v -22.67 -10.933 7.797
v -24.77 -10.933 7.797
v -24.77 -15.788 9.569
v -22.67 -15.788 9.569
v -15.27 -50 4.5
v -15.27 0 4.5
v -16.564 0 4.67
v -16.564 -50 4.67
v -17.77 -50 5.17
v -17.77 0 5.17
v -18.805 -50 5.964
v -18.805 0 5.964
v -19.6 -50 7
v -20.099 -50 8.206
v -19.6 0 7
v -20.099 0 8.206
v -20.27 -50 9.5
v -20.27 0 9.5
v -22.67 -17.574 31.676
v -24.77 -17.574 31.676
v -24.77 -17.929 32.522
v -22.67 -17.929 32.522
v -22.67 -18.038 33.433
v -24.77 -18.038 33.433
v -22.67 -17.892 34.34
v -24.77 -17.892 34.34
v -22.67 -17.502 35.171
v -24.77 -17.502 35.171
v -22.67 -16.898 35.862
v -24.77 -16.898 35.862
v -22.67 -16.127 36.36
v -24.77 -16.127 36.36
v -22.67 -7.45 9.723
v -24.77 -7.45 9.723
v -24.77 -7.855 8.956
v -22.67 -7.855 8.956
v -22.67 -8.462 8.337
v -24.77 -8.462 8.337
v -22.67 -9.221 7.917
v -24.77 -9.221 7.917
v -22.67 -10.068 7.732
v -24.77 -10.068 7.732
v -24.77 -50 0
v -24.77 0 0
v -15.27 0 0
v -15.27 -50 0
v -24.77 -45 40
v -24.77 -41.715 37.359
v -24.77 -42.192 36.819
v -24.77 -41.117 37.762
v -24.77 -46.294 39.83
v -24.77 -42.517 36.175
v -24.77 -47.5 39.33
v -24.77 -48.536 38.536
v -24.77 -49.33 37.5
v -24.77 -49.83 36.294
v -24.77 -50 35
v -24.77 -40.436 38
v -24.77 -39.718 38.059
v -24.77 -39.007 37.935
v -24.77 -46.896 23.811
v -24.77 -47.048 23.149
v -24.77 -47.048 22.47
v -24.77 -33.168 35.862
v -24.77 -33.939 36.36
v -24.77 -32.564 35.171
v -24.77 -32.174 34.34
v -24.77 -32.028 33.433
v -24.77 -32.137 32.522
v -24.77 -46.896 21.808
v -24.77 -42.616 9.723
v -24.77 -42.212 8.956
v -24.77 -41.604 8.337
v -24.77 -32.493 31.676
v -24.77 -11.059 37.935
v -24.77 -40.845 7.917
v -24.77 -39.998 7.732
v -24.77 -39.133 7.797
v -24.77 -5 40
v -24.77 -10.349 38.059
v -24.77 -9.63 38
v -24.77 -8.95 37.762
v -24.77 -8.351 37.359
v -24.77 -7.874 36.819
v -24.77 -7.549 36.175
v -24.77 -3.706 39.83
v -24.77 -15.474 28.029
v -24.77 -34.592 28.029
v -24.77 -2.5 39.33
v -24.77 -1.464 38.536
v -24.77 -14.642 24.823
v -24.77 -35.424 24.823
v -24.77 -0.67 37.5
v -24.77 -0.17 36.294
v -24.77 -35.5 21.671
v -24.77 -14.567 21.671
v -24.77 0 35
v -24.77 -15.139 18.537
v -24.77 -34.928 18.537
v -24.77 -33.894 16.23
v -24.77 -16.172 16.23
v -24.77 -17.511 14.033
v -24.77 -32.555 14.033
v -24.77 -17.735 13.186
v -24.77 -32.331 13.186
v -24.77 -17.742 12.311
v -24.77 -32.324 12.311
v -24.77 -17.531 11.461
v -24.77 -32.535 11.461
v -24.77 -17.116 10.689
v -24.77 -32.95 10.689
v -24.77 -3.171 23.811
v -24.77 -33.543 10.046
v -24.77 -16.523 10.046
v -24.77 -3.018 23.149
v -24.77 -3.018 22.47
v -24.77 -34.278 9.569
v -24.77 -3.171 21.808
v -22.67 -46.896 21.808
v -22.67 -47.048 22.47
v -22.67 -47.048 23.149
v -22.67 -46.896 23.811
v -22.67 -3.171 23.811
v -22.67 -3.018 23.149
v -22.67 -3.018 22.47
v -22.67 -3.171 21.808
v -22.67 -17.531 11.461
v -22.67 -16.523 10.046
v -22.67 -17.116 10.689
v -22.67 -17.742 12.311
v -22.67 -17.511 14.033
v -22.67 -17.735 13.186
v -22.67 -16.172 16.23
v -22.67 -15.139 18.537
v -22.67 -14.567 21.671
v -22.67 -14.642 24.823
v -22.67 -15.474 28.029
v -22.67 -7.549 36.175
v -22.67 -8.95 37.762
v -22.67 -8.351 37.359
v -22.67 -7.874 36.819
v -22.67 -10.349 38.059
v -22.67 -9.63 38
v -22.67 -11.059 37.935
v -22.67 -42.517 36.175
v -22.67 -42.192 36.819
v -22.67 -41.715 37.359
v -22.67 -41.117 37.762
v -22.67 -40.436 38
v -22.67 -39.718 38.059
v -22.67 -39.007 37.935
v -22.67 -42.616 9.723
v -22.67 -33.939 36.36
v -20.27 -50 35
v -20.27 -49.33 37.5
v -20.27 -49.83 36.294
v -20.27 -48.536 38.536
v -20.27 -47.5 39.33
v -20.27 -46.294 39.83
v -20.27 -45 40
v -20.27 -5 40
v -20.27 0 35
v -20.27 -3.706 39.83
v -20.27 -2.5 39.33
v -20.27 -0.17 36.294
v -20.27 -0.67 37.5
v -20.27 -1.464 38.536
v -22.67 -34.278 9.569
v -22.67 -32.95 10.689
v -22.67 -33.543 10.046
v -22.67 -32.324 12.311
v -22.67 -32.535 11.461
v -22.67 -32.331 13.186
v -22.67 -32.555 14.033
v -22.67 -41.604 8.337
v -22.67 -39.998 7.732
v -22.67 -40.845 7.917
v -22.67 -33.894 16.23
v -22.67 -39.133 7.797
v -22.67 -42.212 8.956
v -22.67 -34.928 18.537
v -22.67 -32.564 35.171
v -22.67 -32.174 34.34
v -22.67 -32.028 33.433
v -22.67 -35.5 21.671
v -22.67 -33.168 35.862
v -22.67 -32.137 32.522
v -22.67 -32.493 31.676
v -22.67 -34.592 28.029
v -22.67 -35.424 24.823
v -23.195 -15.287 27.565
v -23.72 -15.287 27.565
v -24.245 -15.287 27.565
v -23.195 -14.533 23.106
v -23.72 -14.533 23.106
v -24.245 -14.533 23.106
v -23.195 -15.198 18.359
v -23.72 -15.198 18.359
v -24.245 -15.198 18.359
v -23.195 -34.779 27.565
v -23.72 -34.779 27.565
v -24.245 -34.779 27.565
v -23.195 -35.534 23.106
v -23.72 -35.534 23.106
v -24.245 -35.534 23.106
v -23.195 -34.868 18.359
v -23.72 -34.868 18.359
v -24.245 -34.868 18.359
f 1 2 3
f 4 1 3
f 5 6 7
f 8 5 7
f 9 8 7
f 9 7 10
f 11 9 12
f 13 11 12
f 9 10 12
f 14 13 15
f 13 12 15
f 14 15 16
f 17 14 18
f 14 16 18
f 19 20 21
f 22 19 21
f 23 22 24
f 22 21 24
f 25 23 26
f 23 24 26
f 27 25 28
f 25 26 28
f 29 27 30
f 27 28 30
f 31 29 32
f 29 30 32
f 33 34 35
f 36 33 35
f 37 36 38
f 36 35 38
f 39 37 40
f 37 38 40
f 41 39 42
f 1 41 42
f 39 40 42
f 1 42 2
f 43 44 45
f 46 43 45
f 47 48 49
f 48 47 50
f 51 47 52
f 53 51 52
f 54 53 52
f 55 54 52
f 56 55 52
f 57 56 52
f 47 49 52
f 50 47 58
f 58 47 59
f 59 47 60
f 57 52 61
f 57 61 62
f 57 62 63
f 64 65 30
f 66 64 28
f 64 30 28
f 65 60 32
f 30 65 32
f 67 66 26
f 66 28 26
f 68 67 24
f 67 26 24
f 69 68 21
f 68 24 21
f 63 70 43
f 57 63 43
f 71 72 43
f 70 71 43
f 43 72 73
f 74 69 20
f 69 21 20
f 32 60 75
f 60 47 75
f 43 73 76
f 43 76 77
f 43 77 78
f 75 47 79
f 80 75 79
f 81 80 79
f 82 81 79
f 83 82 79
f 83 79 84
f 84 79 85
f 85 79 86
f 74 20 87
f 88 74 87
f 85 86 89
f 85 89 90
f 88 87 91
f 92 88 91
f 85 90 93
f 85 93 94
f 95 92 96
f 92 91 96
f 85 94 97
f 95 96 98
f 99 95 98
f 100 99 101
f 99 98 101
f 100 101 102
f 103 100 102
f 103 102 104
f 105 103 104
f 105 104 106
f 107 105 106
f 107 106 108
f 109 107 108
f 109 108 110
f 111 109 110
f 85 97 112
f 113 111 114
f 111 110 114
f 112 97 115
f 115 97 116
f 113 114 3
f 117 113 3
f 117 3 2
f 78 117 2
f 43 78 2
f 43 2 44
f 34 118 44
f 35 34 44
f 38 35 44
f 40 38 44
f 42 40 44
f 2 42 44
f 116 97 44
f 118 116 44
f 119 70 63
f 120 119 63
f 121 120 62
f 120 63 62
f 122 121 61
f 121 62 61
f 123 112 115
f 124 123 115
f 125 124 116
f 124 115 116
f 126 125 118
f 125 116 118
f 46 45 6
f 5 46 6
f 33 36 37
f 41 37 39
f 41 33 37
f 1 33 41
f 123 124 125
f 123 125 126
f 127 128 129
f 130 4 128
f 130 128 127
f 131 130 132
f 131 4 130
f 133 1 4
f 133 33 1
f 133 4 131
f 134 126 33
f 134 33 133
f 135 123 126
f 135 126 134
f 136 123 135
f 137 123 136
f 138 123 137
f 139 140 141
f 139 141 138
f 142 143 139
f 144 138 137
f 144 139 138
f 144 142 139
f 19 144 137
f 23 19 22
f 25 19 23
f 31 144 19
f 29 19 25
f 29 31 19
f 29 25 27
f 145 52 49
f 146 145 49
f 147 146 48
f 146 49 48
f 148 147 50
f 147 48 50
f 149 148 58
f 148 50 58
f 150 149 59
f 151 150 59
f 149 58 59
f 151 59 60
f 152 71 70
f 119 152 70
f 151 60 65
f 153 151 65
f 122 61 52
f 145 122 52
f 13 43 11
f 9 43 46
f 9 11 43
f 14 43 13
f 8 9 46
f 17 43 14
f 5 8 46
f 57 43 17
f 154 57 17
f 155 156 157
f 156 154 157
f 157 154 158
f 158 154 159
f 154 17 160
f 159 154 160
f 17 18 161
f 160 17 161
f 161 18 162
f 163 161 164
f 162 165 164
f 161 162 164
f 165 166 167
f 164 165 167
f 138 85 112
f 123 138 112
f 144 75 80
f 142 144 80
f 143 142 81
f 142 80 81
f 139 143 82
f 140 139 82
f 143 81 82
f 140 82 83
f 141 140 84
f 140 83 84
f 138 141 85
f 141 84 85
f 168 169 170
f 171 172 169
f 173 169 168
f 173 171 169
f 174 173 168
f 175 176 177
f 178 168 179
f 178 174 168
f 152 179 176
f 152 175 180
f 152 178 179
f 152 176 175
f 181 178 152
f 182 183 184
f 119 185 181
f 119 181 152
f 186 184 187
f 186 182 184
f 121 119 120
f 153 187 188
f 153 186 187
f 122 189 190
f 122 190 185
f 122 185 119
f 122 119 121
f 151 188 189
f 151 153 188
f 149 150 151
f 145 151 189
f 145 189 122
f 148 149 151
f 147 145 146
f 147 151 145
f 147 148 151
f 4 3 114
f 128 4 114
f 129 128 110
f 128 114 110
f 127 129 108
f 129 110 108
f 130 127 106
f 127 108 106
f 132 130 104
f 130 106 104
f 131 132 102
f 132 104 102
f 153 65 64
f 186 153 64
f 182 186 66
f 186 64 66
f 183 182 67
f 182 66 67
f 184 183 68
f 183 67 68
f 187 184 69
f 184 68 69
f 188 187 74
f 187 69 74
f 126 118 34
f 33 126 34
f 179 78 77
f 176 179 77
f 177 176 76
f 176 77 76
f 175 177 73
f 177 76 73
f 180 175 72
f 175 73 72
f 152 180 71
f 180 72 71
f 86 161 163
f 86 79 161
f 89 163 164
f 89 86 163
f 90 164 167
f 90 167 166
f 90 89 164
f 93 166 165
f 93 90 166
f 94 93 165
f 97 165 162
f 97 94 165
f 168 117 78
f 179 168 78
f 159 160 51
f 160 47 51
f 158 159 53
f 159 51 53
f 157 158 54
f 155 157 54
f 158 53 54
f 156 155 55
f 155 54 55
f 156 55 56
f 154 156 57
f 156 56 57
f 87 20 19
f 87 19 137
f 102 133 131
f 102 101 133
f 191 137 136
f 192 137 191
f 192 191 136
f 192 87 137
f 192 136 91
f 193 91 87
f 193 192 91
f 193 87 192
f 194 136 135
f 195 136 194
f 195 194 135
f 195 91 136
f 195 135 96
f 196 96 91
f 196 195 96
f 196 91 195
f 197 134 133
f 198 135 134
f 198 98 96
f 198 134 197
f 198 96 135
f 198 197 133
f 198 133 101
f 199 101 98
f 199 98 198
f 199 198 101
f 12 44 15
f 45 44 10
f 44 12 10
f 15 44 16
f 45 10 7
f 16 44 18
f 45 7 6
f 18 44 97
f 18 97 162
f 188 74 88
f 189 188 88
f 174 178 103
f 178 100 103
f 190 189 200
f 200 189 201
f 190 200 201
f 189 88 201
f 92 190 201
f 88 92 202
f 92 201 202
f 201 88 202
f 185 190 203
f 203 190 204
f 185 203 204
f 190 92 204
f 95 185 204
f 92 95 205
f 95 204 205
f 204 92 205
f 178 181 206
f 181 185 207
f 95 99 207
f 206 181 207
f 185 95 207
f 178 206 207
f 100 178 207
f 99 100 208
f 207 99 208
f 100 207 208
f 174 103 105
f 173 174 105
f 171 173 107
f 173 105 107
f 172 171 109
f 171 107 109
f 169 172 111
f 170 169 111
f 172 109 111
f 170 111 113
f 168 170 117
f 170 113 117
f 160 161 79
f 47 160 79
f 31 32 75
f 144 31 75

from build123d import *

# Parameters (mm, degrees)
F1_DEPTH = 50
F2_R     = 5
F3_R     = 5
F5_DEPTH = 2.1


with BuildPart() as f1:
    # F0 (on Front) → F1 (new body)
    with BuildSketch(Plane.XZ):
        with BuildLine():
            Line((-24.7697359324, 0), (-15.2697359324, 0))
            Line((-15.2697359324, 0), (-15.2697359324, 4.5))
            ThreePointArc((-15.2697359324, 4.5), (-18.8052698383, 5.9644660941), (-20.2697359324, 9.5))
            Line((-20.2697359324, 9.5), (-20.2697359324, 40))
            Line((-20.2697359324, 40), (-24.7697359324, 40))
            Line((-24.7697359324, 40), (-24.7697359324, 0))
        make_face()
    extrude(amount=F1_DEPTH)

    # F2
    f2_edges = [f1.edges().sort_by_distance(p)[0] for p in [
        (-22.519736, -50, 40),
    ]]
    fillet(f2_edges, radius=F2_R)

    # F3
    f3_edges = [f1.edges().sort_by_distance(p)[0] for p in [
        (-22.519736, 0, 40),
    ]]
    fillet(f3_edges, radius=F3_R)

    # F4 (on face) → F5 (cut)
    with BuildSketch(Plane(origin=(-24.7697359324, 0, 0), x_dir=(0, -1, 0), z_dir=(-1, 0, 0))):
        with BuildLine():
            Line((46.8955885446, 23.8107649305), (42.5171071131, 36.1752150642))
            ThreePointArc((42.5171071131, 36.1752150642), (41.1165449237, 37.7616933331), (39.0073708388, 37.93452974))
            Line((39.0073708388, 37.93452974), (33.9392572641, 36.3604687154))
            ThreePointArc((33.9392572641, 36.3604687154), (32.1739564338, 34.3397574907), (32.4926399743, 31.675549977))
            add(Edge.make_bspline(
                [(32.4926399743, 31.675549977), (33.3670492771, 30.3381403961), (35.0987739091, 27.6894664778), (35.7199990478, 23.1066149427), (35.2211127015, 18.2107984297), (33.4472667585, 15.4309330693), (32.5552672148, 14.0330446884)],
                knots=[0, 0, 0, 0, 0.2493081883, 0.4937426091, 0.7454224458, 1, 1, 1, 1], degree=3))
            ThreePointArc((32.5552672148, 14.0330446884), (32.5347631708, 11.4606329376), (34.2782102525, 9.5690423623))
            Line((34.2782102525, 9.5690423623), (39.1331128776, 7.7970703132))
            ThreePointArc((39.1331128776, 7.7970703132), (41.2400733133, 8.0993579825), (42.6161779425, 9.723241033))
            Line((42.6161779425, 9.723241033), (46.8955885446, 21.8079237751))
            ThreePointArc((46.8955885446, 21.8079237751), (47.0676640713, 22.8093443528), (46.8955885446, 23.8107649305))
        make_face()
        with BuildLine():
            ThreePointArc((3.1705893979, 23.8107653384), (2.9985138712, 22.8093447607), (3.1705893979, 21.807924183))
            Line((3.1705893979, 21.807924183), (7.45, 9.723241441))
            ThreePointArc((7.45, 9.723241441), (8.8261046292, 8.0993583904), (10.9330650649, 7.7970707212))
            Line((10.9330650649, 7.7970707212), (15.78796769, 9.5690427702))
            ThreePointArc((15.78796769, 9.5690427702), (17.5314147718, 11.4606333455), (17.5109107277, 14.0330450963))
            add(Edge.make_bspline(
                [(17.5735379682, 31.6755503849), (16.6991286655, 30.3381408041), (14.9674040335, 27.6894668857), (14.3461788947, 23.1066153507), (14.8450652411, 18.2107988376), (16.618911184, 15.4309334772), (17.5109107277, 14.0330450963)],
                knots=[0, 0, 0, 0, 0.2493081883, 0.4937426091, 0.7454224458, 1, 1, 1, 1], degree=3))
            ThreePointArc((17.5735379682, 31.6755503849), (17.8922215087, 34.3397578986), (16.1269206784, 36.3604691233))
            Line((16.1269206784, 36.3604691233), (11.0588071037, 37.9345301479))
            ThreePointArc((11.0588071037, 37.9345301479), (8.9496330188, 37.7616937411), (7.5490708294, 36.1752154721))
            Line((7.5490708294, 36.1752154721), (3.1705893979, 23.8107653384))
        make_face()
    extrude(amount=-F5_DEPTH, mode=Mode.SUBTRACT)


solid = f1.part
